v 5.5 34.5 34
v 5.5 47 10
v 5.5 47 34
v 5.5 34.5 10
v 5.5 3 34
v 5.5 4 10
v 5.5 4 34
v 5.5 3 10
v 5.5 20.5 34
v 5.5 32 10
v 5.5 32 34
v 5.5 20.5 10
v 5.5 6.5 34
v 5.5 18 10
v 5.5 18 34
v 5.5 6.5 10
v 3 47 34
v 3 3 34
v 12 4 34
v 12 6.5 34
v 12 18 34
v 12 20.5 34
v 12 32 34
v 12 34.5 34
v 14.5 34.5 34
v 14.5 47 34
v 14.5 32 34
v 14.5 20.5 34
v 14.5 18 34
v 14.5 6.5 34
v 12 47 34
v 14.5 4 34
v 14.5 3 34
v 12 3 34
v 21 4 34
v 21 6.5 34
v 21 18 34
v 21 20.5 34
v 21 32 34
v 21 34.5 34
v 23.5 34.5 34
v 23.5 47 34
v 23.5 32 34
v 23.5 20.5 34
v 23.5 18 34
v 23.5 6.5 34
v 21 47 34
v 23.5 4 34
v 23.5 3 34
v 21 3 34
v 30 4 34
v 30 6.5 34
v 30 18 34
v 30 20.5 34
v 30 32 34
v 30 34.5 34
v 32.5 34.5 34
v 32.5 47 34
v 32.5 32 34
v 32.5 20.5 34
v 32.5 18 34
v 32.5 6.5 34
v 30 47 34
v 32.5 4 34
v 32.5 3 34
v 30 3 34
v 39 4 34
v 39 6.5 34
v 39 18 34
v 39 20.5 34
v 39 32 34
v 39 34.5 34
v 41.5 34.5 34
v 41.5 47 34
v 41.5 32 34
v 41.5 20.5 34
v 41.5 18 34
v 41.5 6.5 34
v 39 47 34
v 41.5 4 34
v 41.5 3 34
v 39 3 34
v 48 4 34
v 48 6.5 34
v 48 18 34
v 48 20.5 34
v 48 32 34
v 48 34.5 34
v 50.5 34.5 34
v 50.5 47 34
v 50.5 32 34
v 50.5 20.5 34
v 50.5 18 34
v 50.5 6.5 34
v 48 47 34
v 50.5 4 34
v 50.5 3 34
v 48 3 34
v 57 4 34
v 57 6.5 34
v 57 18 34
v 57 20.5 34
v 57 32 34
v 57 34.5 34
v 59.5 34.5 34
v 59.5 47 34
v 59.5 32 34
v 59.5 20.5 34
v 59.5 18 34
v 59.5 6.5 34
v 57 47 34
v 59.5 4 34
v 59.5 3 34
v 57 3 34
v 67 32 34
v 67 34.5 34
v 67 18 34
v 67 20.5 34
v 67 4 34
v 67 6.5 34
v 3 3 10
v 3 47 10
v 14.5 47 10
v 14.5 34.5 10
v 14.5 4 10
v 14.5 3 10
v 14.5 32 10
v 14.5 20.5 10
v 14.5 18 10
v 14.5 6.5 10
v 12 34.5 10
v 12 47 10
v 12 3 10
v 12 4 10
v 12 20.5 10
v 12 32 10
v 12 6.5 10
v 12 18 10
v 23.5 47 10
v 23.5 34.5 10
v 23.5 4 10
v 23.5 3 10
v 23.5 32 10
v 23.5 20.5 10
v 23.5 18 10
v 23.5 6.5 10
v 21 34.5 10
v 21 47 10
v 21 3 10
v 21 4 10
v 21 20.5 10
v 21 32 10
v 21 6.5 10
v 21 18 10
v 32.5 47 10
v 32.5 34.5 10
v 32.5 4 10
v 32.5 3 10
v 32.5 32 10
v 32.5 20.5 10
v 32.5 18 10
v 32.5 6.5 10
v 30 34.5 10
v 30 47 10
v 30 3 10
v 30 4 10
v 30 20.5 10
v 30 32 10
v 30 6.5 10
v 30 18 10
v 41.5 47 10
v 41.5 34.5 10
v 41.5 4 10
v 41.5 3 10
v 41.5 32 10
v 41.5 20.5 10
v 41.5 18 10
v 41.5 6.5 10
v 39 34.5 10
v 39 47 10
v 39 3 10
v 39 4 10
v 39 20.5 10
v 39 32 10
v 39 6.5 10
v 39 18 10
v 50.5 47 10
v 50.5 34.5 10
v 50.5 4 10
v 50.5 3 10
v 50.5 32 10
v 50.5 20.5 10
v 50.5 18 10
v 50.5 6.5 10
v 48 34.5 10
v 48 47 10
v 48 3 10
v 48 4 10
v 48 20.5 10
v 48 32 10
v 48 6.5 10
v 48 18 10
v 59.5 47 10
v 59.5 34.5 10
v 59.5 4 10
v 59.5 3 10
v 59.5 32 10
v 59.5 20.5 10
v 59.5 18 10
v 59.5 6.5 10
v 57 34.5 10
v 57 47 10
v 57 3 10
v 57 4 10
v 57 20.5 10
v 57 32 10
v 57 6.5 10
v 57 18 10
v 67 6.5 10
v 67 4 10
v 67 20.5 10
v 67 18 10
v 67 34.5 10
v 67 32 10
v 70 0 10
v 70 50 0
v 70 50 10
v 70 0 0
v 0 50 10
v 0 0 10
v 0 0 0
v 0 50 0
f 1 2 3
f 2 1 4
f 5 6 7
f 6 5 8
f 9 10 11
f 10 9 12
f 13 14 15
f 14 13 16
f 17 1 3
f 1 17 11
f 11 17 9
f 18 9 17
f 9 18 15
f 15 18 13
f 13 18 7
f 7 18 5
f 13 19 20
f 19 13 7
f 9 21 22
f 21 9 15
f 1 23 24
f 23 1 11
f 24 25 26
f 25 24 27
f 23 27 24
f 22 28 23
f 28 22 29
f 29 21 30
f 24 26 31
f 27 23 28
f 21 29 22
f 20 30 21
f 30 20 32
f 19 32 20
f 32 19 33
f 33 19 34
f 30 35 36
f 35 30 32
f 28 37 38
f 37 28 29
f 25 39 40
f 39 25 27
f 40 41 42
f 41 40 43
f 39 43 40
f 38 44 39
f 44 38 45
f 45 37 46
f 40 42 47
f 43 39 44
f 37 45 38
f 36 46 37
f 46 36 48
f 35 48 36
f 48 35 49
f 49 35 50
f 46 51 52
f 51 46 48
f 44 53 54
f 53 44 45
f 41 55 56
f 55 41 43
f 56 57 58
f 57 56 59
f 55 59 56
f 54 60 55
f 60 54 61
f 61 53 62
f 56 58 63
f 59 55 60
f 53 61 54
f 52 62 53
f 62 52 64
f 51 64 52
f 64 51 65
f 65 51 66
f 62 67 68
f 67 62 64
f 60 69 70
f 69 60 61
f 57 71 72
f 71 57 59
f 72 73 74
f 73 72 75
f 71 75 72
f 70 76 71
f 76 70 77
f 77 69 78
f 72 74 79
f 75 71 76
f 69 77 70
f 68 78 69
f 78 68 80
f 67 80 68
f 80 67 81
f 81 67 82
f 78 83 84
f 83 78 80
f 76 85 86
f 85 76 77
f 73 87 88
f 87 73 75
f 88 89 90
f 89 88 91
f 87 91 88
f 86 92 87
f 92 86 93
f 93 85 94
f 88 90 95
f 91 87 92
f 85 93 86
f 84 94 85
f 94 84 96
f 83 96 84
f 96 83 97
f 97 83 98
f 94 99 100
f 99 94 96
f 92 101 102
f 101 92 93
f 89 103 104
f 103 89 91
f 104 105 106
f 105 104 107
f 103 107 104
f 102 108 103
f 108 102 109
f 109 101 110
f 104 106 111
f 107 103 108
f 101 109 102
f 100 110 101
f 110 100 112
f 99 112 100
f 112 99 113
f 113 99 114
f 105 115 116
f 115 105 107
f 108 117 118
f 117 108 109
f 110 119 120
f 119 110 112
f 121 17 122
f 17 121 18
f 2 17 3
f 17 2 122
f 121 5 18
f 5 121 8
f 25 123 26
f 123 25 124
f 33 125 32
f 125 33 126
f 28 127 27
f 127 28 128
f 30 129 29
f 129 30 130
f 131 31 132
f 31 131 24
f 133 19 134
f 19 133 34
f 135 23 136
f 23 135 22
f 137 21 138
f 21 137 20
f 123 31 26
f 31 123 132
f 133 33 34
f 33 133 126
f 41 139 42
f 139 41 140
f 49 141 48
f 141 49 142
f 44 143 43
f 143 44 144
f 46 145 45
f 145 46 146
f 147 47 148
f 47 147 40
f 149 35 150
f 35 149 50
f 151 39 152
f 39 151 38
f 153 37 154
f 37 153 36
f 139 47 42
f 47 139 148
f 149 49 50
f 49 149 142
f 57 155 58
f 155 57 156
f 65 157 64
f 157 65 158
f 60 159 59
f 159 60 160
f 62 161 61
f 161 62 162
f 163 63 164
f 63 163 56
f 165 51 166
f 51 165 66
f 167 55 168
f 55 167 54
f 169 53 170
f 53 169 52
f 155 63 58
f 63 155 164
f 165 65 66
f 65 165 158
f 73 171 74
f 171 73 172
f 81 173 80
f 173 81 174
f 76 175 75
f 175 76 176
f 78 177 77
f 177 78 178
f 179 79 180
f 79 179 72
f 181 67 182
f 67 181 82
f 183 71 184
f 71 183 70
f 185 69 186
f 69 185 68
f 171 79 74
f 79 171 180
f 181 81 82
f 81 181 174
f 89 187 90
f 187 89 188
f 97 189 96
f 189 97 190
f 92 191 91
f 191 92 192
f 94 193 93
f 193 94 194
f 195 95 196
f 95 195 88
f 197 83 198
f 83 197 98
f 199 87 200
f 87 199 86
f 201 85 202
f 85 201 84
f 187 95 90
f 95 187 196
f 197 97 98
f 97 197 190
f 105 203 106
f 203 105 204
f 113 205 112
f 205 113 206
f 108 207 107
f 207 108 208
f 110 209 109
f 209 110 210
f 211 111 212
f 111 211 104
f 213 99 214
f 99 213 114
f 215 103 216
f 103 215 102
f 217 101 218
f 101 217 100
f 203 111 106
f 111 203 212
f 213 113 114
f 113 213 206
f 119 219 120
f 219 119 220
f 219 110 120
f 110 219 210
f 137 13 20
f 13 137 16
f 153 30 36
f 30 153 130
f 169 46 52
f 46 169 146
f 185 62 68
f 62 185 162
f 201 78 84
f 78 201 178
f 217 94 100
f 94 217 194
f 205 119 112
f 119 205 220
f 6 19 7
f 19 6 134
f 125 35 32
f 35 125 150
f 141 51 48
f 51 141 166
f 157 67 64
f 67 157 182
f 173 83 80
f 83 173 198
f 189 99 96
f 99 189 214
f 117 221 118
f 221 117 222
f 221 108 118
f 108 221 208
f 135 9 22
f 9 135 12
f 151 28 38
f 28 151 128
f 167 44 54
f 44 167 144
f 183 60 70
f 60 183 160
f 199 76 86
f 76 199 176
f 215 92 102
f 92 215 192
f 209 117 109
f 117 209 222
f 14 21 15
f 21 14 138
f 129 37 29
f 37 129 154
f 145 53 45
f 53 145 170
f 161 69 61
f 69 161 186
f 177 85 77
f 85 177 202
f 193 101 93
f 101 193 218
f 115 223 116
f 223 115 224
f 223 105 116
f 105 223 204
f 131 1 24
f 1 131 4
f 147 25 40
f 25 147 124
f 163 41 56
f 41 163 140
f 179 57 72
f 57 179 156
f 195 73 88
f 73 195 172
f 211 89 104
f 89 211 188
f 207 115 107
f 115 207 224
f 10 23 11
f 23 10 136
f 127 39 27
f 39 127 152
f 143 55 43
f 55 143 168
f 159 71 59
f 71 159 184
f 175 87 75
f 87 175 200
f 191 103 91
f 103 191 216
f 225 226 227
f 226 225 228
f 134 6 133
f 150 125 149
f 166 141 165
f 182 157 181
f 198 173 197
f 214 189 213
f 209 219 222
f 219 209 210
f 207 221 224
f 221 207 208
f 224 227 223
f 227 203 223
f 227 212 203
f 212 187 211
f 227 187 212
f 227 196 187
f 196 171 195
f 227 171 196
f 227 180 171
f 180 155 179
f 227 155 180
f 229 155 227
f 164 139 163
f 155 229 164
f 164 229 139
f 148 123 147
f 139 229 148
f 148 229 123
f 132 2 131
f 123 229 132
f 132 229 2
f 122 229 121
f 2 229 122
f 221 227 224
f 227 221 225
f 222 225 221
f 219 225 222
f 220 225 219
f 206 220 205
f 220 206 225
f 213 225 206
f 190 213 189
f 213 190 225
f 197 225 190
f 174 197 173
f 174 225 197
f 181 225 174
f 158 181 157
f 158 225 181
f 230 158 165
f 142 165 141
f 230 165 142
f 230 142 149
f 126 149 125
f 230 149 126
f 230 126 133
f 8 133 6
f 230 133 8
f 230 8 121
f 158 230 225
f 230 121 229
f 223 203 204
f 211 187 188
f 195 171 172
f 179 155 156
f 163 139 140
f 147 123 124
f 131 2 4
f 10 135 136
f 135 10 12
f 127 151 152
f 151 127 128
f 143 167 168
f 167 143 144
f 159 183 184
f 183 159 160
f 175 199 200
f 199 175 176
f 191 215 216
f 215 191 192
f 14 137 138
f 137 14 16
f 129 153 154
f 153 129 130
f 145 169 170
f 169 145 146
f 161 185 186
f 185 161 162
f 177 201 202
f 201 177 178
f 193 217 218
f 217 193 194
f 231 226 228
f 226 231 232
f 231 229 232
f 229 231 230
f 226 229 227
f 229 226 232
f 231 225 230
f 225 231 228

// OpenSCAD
$fn = 32;

// ----------------------------------------------------------------------
// Heatsink: cross fin block
// ----------------------------------------------------------------------

// --- parameters (mm) ---
base_l = 70;              // base length, X
base_w = 50;              // base width, Y
base_t = 10;              // base plate thickness
fin_h = 25;               // fin height above the base
fin_t = 2.5;              // fin thickness
edge = 3;                 // margin from the base ends
pitch = 9;                // fin pitch
rib_pitch = 14;           // cross rib pitch

n_fins = floor((base_l - 2 * edge - fin_t) / pitch) + 1;  // fin count
total_h = base_t + fin_h - 1;  // overall height
n_ribs = floor((base_w - 2 * edge) / rib_pitch);  // rib count

union() {
  cube([base_l, base_w, base_t]);
  for (i = [0 : n_fins - 1])
    translate([edge + i * pitch, edge, base_t - 1])
      cube([fin_t, base_w - 2 * edge, fin_h]);
  for (i = [0 : n_ribs - 1])
    translate([edge, edge + 1 + i * rib_pitch, base_t - 1])
      cube([base_l - 2 * edge, fin_t, fin_h]);
}
